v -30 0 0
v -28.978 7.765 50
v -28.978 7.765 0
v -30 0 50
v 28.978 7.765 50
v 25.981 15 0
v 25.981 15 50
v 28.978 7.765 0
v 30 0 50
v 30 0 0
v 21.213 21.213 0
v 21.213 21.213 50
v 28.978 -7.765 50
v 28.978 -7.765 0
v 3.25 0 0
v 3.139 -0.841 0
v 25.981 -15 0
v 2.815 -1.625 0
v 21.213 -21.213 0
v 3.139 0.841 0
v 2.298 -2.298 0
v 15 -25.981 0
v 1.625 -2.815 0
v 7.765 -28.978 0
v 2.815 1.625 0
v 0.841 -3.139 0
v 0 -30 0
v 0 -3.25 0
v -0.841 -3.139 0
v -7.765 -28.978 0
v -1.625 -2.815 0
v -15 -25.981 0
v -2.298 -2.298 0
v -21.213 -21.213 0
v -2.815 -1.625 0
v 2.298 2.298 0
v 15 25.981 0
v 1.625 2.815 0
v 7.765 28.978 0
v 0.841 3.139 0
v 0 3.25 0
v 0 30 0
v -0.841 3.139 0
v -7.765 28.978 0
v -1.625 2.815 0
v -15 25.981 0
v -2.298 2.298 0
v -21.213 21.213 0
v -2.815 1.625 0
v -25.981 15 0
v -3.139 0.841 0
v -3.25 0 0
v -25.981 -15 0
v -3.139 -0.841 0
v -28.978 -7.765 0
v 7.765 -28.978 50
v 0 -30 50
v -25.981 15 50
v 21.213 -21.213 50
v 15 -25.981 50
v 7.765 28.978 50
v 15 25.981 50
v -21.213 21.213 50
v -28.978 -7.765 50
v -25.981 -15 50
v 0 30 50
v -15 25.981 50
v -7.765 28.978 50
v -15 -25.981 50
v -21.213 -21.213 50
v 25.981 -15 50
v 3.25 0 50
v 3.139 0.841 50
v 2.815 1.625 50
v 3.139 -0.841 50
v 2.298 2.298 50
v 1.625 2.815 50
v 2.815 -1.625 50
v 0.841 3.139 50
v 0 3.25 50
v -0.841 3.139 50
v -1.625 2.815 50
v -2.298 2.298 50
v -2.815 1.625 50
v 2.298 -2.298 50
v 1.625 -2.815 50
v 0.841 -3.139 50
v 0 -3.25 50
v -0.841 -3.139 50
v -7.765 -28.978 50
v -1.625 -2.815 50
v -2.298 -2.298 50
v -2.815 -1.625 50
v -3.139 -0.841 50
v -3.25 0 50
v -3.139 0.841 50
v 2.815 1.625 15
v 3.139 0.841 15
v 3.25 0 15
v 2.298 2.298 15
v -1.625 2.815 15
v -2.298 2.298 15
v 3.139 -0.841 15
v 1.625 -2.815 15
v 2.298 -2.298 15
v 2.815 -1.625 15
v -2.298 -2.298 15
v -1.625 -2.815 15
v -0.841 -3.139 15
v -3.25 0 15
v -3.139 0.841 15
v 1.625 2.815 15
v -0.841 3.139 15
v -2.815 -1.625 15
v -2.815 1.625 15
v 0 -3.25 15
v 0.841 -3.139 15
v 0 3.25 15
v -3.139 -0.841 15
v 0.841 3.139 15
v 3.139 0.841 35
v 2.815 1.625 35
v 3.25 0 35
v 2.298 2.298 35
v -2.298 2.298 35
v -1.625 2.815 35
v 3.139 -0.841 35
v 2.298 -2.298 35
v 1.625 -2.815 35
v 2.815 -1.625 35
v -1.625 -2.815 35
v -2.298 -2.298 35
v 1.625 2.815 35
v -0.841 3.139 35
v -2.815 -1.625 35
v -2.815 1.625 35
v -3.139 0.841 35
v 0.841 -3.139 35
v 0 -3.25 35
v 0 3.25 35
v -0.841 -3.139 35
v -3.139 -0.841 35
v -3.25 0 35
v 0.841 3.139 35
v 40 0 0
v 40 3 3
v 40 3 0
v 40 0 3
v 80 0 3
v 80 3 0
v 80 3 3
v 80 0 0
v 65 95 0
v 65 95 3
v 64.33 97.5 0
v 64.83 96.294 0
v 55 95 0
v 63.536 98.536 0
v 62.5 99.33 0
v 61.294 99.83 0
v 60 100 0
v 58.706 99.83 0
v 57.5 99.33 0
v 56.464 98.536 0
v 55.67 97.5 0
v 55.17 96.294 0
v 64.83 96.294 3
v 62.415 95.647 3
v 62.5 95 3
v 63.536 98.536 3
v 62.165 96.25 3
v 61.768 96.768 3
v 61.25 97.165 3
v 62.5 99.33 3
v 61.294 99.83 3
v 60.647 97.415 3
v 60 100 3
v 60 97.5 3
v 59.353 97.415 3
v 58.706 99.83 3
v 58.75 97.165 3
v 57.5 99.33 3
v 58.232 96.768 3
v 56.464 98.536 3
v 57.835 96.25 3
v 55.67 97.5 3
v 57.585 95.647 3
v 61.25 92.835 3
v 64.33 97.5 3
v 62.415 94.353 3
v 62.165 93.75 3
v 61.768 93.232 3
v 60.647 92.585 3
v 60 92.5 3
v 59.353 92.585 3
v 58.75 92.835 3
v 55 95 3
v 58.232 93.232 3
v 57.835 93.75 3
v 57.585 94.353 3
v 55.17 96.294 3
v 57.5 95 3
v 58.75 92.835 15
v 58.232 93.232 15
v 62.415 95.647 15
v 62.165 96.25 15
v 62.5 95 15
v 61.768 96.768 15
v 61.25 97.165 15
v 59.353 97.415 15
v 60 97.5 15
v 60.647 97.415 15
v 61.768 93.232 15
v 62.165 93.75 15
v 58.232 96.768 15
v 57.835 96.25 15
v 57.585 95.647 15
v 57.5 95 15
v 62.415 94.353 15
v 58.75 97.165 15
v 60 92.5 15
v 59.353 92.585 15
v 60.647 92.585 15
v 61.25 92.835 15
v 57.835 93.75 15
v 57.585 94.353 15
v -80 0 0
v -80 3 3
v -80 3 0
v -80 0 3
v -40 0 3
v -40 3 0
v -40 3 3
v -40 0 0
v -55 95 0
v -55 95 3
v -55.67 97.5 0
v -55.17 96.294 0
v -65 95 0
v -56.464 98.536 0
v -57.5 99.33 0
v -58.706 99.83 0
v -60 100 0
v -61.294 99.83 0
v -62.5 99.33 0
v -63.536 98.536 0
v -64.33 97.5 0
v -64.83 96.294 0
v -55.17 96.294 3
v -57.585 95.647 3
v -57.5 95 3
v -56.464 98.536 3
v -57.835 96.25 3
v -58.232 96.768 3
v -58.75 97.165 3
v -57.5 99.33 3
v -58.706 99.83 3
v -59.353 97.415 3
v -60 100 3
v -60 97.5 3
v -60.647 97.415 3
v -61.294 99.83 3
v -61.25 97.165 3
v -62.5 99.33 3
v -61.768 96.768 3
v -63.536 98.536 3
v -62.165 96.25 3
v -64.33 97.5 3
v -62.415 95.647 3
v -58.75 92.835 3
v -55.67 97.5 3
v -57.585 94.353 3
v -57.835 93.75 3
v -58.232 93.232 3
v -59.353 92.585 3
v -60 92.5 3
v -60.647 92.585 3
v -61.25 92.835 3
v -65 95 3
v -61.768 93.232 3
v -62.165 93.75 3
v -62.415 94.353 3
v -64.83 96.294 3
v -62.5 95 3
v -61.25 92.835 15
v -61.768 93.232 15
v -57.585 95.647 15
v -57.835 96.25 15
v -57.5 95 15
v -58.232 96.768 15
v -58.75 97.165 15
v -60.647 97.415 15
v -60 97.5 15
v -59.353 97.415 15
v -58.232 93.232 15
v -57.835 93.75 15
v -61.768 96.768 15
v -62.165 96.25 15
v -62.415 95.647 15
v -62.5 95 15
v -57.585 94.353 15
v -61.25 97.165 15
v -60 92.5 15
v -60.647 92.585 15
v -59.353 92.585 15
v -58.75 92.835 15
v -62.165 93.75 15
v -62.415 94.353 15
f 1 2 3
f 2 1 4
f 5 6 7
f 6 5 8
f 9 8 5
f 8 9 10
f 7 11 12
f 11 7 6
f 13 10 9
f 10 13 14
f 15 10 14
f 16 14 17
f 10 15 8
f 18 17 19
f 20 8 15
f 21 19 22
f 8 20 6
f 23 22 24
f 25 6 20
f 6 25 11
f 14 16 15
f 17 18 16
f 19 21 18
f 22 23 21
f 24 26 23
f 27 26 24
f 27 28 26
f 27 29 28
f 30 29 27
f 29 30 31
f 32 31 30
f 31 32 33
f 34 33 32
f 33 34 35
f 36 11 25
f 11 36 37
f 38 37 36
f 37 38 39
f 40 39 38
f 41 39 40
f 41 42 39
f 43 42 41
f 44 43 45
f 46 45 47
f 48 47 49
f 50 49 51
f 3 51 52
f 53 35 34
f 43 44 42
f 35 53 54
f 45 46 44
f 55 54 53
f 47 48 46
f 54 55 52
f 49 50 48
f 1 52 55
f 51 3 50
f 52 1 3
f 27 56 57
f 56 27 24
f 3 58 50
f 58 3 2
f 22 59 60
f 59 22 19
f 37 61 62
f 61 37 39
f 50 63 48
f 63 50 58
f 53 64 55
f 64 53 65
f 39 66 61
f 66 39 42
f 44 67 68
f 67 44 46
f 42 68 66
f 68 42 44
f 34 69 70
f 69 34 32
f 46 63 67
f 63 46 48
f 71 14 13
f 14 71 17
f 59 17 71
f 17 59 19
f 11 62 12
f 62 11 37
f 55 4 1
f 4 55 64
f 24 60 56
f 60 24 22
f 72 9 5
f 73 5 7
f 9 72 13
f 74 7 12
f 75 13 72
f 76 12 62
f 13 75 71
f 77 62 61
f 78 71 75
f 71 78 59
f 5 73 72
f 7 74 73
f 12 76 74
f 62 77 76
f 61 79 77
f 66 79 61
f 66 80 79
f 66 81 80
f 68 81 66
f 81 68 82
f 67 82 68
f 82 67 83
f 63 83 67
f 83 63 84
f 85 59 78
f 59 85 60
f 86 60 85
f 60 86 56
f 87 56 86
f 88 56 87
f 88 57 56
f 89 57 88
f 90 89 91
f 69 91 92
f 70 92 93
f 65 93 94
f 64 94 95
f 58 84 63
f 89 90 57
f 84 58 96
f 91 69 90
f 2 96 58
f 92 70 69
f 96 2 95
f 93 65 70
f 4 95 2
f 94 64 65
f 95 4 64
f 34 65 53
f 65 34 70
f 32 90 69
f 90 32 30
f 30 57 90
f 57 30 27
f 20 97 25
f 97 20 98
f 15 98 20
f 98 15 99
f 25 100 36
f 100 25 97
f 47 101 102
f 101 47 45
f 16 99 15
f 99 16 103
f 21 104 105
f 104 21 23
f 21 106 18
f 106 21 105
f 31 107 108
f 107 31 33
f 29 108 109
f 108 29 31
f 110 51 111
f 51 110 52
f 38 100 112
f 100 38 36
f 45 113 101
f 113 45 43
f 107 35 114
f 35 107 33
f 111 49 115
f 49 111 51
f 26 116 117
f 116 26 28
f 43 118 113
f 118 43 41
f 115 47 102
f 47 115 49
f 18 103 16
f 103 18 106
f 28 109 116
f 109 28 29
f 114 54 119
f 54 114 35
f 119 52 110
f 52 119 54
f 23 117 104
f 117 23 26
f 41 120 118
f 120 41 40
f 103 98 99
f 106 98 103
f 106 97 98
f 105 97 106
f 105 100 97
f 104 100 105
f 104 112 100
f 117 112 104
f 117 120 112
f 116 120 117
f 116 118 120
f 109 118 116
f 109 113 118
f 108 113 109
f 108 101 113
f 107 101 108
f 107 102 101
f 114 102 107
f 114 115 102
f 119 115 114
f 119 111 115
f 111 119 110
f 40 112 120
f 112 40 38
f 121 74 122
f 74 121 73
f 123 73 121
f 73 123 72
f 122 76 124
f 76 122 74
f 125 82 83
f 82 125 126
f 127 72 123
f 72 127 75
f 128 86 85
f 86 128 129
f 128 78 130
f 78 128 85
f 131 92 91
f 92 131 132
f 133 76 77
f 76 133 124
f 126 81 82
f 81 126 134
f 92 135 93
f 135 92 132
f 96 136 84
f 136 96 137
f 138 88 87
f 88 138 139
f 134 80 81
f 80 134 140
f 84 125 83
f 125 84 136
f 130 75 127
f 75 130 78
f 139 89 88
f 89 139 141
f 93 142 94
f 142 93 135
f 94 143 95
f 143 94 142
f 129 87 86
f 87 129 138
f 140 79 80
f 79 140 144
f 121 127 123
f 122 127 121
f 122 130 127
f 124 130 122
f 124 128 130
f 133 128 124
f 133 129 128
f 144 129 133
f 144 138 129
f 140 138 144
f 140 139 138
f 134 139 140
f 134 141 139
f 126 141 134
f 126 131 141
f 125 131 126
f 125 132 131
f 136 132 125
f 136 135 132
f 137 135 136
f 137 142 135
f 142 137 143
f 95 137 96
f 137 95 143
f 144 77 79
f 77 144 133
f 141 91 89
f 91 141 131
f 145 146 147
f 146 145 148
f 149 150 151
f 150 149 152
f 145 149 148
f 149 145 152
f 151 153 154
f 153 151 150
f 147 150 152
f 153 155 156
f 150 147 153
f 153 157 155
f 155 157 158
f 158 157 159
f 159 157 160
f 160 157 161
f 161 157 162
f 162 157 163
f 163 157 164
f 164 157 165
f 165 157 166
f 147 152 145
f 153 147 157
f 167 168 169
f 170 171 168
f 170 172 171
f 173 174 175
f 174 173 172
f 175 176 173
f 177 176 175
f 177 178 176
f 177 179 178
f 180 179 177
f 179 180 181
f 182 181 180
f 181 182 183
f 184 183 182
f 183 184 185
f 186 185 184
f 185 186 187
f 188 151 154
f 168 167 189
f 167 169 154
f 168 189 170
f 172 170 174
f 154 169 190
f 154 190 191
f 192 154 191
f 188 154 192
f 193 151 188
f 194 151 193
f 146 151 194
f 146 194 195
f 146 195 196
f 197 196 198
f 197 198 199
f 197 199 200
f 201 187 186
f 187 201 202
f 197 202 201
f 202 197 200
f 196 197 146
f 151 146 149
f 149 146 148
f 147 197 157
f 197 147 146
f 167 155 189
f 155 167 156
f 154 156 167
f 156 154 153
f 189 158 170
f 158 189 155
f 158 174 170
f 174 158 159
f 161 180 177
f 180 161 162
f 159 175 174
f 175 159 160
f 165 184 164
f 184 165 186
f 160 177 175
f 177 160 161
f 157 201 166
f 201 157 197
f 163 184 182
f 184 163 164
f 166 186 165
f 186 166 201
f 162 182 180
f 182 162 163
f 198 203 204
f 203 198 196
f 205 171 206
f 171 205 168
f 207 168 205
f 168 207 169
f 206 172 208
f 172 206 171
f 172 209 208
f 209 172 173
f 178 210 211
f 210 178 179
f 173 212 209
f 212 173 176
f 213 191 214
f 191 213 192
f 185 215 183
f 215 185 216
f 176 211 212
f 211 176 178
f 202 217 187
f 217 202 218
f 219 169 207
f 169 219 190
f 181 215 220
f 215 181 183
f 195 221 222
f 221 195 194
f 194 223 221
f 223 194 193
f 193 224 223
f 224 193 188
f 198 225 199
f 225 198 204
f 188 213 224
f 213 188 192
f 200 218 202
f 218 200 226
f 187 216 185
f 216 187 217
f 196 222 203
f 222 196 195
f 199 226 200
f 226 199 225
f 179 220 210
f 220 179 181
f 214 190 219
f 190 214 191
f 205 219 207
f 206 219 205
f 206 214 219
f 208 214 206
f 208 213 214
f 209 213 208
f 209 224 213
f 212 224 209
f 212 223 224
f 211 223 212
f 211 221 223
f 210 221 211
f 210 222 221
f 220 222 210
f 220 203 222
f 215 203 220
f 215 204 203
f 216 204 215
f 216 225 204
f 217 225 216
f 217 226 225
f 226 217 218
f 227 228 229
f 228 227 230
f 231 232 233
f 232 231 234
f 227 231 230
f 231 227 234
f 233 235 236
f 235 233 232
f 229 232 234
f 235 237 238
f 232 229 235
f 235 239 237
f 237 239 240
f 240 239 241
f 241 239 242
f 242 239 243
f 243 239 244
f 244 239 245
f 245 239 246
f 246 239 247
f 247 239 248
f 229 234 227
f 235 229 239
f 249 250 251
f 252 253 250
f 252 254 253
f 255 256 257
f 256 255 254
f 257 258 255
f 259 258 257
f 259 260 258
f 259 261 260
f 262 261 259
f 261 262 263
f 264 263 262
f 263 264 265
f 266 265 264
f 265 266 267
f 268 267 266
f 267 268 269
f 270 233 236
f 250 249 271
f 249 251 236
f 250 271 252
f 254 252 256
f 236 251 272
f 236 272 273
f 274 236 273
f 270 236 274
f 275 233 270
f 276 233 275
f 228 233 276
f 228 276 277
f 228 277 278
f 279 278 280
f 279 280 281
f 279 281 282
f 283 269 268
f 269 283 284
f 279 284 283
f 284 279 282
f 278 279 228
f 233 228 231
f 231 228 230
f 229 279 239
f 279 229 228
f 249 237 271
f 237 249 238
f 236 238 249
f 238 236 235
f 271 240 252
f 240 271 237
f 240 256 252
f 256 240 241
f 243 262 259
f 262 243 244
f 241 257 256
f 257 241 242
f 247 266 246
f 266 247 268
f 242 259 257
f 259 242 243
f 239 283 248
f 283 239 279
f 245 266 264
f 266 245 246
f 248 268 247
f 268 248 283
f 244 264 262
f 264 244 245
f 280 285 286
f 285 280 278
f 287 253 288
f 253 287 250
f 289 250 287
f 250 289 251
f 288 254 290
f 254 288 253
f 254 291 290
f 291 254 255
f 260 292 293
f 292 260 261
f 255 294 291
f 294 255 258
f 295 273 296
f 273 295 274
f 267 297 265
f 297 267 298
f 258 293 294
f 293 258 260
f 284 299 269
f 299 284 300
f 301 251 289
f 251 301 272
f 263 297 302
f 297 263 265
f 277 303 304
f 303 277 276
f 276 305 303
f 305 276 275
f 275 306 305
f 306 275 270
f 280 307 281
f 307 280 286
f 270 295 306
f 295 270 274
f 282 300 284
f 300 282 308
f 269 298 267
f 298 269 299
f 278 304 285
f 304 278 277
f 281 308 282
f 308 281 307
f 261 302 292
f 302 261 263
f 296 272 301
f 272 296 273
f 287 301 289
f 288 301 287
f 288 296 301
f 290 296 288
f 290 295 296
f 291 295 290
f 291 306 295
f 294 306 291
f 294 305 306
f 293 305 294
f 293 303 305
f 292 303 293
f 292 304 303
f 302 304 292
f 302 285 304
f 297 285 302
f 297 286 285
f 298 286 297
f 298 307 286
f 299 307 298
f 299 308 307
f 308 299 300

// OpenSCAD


// radius cylinder
ray_cyl = 30;
// height cylinder
haut_cyl = 50;

module toto() {
}


$fn = 24;
tol_trou = 1.5;
ray_trou = 2.5;
haut_trou = 15;
ep_pied = 3;
haut_pied = ray_cyl*3;


support();

pied_gauche();

pied_droit();

module support() {

	difference() {
		cylinder(r=ray_cyl,h=haut_cyl);
		cylinder(r=ray_trou+tol_trou/2,h=haut_trou);
		translate([0,0,haut_cyl-haut_trou])
		cylinder(r=ray_trou+tol_trou/2,h=haut_trou);
	}
}

module pied_gauche() {
	
	translate([ray_cyl+10,0,0]) {
		union() {
			hull() {
				cube([ray_cyl/3*4,ep_pied,3]);
				translate([ray_cyl/3*4/2,0,0])
				translate([0,haut_pied,3/2])
				cube([ray_trou*4,ray_trou*4,ep_pied], center = true);
			}
			translate([ray_cyl/3*4/2,0,0])
			translate([0,haut_pied+ray_trou*4/2,3/2])	
			cylinder(r=ray_trou*4/2,h=ep_pied,center=true);
			translate([ray_cyl/3*4/2,0,ep_pied])
			translate([0,haut_pied+ray_trou*4/2,ep_pied+3/2])
			cylinder(r=ray_trou,h=haut_trou,center=true);
		}
	}
}

module pied_droit() {
	
	translate([-(ray_cyl/3*4+ray_cyl+10),0,0]) {
		union() {
			hull() {
				cube([ray_cyl/3*4,ep_pied,3]);
				translate([ray_cyl/3*4/2,0,0])
				translate([0,haut_pied,3/2])
				cube([ray_trou*4,ray_trou*4,ep_pied], center = true);
			}
			translate([ray_cyl/3*4/2,0,0])
			translate([0,haut_pied+ray_trou*4/2,3/2])	
			cylinder(r=ray_trou*4/2,h=ep_pied,center=true);
			translate([ray_cyl/3*4/2,0,ep_pied])
			translate([0,haut_pied+ray_trou*4/2,ep_pied+3/2])
			cylinder(r=ray_trou,h=haut_trou,center=true);
		}
	}
}


































